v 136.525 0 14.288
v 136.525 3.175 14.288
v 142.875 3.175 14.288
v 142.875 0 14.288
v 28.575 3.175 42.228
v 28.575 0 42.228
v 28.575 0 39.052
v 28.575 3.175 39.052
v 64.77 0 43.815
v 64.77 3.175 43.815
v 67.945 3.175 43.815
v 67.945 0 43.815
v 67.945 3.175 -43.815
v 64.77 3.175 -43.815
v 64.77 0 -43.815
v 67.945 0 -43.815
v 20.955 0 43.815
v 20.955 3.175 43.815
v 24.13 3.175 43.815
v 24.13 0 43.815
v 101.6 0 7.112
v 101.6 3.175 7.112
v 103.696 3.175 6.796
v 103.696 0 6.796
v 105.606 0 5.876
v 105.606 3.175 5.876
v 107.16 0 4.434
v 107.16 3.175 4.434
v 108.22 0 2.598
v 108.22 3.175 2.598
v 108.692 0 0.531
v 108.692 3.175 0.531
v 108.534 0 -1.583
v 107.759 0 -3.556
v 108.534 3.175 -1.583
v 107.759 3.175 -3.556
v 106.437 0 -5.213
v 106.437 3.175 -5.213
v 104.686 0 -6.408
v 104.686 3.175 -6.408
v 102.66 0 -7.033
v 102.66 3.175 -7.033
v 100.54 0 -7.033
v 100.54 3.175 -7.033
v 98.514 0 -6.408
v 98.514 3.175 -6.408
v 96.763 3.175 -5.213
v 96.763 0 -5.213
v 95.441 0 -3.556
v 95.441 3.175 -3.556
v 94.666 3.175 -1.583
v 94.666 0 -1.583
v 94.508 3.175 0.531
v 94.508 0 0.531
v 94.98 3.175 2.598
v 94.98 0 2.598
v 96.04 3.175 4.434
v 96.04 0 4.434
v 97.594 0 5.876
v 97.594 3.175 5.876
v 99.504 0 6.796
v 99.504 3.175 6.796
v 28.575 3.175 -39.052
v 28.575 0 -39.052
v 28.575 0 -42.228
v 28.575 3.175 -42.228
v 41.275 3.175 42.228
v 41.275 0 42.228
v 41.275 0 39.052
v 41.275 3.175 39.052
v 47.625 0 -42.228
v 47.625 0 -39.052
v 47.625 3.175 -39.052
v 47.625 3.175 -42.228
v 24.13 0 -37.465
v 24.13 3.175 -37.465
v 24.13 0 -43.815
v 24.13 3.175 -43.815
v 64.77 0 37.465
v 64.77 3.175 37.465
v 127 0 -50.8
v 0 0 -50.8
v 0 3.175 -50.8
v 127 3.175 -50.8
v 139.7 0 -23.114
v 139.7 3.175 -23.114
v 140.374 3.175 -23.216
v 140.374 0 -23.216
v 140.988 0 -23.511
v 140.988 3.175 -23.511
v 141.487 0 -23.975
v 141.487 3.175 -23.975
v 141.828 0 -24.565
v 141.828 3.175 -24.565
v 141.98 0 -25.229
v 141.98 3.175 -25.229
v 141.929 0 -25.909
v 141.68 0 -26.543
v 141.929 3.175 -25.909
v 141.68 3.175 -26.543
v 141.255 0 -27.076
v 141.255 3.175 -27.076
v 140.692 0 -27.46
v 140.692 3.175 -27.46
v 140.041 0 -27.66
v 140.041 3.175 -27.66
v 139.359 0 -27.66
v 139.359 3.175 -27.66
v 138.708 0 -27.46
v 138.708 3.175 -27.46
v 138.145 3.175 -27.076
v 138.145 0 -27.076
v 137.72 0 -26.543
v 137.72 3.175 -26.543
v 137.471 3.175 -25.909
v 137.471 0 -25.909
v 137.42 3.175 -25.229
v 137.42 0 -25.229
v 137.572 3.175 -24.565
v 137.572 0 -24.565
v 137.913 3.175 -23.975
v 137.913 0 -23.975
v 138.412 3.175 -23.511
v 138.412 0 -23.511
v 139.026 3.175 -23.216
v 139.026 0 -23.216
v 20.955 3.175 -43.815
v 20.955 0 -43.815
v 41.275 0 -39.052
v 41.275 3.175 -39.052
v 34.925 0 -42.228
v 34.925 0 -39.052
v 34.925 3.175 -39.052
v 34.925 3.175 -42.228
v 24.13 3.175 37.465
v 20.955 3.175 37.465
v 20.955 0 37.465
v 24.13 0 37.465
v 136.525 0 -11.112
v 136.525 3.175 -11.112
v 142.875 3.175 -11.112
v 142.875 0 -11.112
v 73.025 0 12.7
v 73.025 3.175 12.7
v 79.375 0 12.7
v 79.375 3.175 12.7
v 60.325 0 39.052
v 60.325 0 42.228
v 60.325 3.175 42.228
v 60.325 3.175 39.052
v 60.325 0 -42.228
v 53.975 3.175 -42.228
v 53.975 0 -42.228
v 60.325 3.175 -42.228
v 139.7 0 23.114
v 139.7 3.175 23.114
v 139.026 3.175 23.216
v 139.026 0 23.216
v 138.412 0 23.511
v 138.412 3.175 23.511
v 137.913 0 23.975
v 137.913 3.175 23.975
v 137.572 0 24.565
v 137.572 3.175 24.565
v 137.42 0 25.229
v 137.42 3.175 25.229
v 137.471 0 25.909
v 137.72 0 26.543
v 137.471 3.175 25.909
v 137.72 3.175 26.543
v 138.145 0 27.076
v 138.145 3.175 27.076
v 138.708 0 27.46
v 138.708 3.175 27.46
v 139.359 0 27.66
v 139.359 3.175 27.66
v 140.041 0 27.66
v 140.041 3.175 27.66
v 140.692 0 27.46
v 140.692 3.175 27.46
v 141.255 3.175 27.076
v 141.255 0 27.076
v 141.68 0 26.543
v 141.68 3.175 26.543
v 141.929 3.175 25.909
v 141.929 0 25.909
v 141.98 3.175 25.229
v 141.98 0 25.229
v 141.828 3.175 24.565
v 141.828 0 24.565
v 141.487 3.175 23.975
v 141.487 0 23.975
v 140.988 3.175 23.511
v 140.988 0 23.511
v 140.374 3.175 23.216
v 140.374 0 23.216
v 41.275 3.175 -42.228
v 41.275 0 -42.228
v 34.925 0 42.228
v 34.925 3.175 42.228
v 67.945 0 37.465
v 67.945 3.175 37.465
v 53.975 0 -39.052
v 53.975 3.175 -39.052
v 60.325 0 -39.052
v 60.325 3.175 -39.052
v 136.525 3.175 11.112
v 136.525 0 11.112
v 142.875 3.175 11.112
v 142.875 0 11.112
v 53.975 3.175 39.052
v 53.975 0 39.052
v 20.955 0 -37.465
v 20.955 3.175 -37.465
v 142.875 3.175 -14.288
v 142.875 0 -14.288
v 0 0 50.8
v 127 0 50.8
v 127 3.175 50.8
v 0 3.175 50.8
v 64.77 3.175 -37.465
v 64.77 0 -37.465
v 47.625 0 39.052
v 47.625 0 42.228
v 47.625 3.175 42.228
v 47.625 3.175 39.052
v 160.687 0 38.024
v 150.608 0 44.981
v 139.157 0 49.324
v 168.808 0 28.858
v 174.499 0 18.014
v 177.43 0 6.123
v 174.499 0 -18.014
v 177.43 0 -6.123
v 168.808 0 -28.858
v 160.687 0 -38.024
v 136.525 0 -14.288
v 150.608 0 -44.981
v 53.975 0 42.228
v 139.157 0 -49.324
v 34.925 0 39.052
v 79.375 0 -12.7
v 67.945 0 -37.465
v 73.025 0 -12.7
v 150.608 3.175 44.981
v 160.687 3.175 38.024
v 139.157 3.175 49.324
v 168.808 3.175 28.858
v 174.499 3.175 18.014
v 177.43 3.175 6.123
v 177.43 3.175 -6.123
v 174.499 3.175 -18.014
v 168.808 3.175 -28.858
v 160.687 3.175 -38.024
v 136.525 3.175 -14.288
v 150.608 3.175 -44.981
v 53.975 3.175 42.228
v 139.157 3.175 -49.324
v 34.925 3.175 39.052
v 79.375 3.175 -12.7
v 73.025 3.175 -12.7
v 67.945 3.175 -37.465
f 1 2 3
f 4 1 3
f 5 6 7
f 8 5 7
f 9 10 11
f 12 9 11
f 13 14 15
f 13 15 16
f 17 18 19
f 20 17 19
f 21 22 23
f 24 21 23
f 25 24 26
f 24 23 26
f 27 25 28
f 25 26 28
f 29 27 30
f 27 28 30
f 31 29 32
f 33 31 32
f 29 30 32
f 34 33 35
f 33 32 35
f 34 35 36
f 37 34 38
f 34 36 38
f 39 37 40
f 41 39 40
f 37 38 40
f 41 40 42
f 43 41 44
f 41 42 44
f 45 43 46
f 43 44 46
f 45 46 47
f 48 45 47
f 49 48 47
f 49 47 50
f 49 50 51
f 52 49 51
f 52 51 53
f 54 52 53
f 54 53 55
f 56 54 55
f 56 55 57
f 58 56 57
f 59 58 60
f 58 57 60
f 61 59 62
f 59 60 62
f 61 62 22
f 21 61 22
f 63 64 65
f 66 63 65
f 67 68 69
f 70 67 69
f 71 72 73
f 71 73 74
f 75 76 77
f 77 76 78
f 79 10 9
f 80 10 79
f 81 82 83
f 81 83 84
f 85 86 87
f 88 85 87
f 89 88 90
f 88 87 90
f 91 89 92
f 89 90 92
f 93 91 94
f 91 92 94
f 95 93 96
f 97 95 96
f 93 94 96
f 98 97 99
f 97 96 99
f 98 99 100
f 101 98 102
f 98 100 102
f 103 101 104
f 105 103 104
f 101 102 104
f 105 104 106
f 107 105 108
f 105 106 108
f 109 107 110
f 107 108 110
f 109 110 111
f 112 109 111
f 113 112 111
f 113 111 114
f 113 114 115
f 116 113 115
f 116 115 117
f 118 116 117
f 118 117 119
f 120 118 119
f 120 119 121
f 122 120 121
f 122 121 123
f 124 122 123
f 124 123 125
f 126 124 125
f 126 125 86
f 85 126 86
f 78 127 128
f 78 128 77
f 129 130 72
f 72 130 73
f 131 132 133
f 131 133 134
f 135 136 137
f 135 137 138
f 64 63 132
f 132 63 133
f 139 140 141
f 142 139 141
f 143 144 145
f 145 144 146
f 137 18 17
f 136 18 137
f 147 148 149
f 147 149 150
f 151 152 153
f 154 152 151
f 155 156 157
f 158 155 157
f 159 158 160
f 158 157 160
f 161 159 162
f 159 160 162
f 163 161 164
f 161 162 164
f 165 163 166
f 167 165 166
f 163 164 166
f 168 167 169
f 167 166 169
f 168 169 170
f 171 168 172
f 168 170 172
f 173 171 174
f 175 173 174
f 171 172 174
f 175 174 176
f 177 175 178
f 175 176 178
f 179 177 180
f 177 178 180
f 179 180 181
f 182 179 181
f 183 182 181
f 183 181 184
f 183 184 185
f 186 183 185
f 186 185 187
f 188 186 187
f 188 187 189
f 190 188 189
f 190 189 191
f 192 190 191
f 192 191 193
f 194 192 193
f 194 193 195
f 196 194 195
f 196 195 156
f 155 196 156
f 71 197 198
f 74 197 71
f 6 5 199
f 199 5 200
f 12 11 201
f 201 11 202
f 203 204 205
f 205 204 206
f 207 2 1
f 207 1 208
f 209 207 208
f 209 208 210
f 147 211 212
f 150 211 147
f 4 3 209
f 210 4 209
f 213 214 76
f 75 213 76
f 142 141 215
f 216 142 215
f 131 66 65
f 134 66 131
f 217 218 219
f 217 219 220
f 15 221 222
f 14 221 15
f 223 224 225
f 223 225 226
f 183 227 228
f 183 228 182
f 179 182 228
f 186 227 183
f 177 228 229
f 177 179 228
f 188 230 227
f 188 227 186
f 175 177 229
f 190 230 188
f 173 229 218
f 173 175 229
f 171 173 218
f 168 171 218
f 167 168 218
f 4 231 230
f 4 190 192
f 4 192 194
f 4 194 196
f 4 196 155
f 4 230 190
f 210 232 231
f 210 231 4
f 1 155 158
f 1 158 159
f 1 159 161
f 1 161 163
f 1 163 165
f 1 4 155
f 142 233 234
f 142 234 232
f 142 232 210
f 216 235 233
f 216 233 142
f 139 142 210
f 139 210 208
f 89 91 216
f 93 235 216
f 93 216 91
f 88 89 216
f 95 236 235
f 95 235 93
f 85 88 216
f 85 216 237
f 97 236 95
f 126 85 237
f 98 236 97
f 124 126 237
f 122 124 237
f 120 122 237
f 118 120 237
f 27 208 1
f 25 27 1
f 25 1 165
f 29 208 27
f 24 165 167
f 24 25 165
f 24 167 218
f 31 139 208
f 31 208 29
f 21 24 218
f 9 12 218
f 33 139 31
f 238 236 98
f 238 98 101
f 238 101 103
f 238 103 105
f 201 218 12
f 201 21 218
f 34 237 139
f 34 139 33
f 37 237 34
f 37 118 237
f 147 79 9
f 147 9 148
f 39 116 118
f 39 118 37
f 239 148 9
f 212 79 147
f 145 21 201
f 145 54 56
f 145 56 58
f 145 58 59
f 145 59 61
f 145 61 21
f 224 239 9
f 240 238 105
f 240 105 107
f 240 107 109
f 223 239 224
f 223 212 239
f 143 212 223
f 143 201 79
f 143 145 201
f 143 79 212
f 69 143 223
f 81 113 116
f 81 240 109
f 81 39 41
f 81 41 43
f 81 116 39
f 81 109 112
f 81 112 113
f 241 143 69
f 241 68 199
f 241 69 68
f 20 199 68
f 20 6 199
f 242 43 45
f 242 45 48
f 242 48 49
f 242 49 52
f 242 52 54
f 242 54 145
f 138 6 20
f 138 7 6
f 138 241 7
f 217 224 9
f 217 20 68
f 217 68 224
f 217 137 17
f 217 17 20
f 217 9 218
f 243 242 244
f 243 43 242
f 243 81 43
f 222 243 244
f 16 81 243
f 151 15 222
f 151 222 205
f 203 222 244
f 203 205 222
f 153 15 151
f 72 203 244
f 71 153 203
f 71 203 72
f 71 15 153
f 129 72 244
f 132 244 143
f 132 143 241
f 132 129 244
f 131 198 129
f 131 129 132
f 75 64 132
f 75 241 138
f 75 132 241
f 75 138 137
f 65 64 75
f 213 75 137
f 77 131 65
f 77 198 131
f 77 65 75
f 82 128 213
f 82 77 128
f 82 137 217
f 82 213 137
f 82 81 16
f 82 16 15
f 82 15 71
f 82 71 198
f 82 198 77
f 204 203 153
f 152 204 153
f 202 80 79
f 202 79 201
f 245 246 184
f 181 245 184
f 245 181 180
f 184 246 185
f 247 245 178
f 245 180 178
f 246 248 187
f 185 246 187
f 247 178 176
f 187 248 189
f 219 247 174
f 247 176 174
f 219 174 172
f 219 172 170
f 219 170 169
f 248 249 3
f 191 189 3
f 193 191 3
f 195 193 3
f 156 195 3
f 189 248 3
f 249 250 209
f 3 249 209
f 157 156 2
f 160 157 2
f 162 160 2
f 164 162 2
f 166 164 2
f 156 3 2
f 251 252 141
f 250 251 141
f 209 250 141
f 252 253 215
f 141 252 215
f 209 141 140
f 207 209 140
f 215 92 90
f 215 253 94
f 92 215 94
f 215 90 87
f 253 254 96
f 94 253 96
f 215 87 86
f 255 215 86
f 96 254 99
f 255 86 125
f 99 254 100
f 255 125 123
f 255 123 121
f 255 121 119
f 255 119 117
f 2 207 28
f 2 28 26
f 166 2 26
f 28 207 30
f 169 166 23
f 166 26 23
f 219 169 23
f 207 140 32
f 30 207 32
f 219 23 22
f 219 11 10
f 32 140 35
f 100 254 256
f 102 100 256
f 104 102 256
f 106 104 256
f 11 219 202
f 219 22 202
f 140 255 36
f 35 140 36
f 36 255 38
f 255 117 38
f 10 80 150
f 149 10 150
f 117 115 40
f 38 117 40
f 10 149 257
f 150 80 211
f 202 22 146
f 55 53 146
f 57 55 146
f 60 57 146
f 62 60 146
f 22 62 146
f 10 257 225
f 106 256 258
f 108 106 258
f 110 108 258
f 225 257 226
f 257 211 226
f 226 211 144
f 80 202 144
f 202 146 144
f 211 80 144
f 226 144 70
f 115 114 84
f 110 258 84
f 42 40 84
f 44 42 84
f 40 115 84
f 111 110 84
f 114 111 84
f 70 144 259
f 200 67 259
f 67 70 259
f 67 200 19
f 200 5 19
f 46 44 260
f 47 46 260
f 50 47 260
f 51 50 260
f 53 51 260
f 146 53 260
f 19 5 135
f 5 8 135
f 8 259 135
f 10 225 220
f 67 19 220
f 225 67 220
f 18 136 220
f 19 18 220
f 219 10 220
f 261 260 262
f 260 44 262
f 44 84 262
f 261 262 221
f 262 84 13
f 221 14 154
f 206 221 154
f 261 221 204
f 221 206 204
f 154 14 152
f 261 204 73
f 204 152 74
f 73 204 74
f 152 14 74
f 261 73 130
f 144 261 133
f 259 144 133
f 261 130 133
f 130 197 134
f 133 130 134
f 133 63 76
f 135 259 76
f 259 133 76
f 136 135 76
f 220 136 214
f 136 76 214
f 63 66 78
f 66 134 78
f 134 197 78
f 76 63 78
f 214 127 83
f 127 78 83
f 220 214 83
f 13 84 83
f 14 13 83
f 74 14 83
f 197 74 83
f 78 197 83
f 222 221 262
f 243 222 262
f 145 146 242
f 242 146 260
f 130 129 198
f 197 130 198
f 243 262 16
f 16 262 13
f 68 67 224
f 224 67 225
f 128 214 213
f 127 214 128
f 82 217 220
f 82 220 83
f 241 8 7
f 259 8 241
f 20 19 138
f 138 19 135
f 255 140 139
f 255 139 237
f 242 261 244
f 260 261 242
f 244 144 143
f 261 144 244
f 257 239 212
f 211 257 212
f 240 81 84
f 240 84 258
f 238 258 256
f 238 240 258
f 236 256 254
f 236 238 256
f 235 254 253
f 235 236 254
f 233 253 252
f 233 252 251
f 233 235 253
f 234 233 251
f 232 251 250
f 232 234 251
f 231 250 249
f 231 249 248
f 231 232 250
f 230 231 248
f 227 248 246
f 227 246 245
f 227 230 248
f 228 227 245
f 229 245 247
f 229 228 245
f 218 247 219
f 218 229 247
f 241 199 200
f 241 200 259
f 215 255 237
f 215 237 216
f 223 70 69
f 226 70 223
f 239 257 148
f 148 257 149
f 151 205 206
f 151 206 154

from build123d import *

# Parameters (mm, degrees)
BOSS_EXTRUDE1_DEPTH = 3.175
CUT_EXTRUDE2_REACH  = 186.942
SKETCH3_W           = 3.175
SKETCH3_H           = 6.35
CUT_EXTRUDE3_REACH  = 186.942
SKETCH4_R           = 2.286
SKETCH5_W           = 6.35
SKETCH5_H           = 3.175
CUT_EXTRUDE4_DEPTH  = 3.175
SKETCH6_W           = 6.35
SKETCH6_H           = 3.175
CUT_EXTRUDE5_DEPTH  = 3.175
SKETCH7_R           = 7.112
SKETCH7_W           = 6.35
SKETCH7_H           = 25.4
CUT_EXTRUDE6_DEPTH  = 3.175


with BuildPart() as part:
    # Sketch1 → Boss-Extrude1 (new body)
    with BuildSketch(Plane(origin=(0, 0, 0), x_dir=(1, 0, 0), z_dir=(0, 1, 0))):
        with BuildLine():
            Line((0, -50.8), (0, 50.8))
            Line((0, 50.8), (127, 50.8))
            ThreePointArc((127, 50.8), (177.8, 0), (127, -50.8))
            Line((127, -50.8), (0, -50.8))
        make_face()
    extrude(amount=BOSS_EXTRUDE1_DEPTH)

    # Sketch3 → Cut-Extrude2 (cut, up to next)
    with BuildSketch(Plane(origin=(0, 3.175, 0), x_dir=(1, 0, 0), z_dir=(0, 1, 0)), mode=Mode.PRIVATE) as cut_extrude2_sk1:
        with Locations((22.5425, 40.64)):
            Rectangle(SKETCH3_W, SKETCH3_H)
    cut_extrude2_tool1 = extrude(cut_extrude2_sk1.sketch, amount=-CUT_EXTRUDE2_REACH, mode=Mode.PRIVATE) & part.part
    # Sketch3 → Cut-Extrude2 (cut, up to next)
    with BuildSketch(Plane(origin=(0, 3.175, 0), x_dir=(1, 0, 0), z_dir=(0, 1, 0)), mode=Mode.PRIVATE) as cut_extrude2_sk2:
        with Locations((66.3575, 40.64)):
            Rectangle(SKETCH3_W, SKETCH3_H)
    cut_extrude2_tool2 = extrude(cut_extrude2_sk2.sketch, amount=-CUT_EXTRUDE2_REACH, mode=Mode.PRIVATE) & part.part
    # Sketch3 → Cut-Extrude2 (cut, up to next)
    with BuildSketch(Plane(origin=(0, 3.175, 0), x_dir=(1, 0, 0), z_dir=(0, 1, 0)), mode=Mode.PRIVATE) as cut_extrude2_sk3:
        with Locations((66.3575, -40.64)):
            Rectangle(SKETCH3_W, SKETCH3_H)
    cut_extrude2_tool3 = extrude(cut_extrude2_sk3.sketch, amount=-CUT_EXTRUDE2_REACH, mode=Mode.PRIVATE) & part.part
    # Sketch3 → Cut-Extrude2 (cut, up to next)
    with BuildSketch(Plane(origin=(0, 3.175, 0), x_dir=(1, 0, 0), z_dir=(0, 1, 0)), mode=Mode.PRIVATE) as cut_extrude2_sk4:
        with Locations((22.5425, -40.64)):
            Rectangle(SKETCH3_W, SKETCH3_H)
    cut_extrude2_tool4 = extrude(cut_extrude2_sk4.sketch, amount=-CUT_EXTRUDE2_REACH, mode=Mode.PRIVATE) & part.part
    add(cut_extrude2_tool1.solids().sort_by_distance((22.5425, 3.175, -40.64))[0], mode=Mode.SUBTRACT)
    add(cut_extrude2_tool2.solids().sort_by_distance((66.3575, 3.175, -40.64))[0], mode=Mode.SUBTRACT)
    add(cut_extrude2_tool3.solids().sort_by_distance((66.3575, 3.175, 40.64))[0], mode=Mode.SUBTRACT)
    add(cut_extrude2_tool4.solids().sort_by_distance((22.5425, 3.175, 40.64))[0], mode=Mode.SUBTRACT)

    # Sketch4 → Cut-Extrude3 (cut, up to next)
    with BuildSketch(Plane(origin=(0, 3.175, 0), x_dir=(1, 0, 0), z_dir=(0, 1, 0)), mode=Mode.PRIVATE) as cut_extrude3_sk1:
        with Locations(Location((139.7, 25.4, 0), (0, 0, 270))):
            Circle(SKETCH4_R)
    cut_extrude3_tool1 = extrude(cut_extrude3_sk1.sketch, amount=-CUT_EXTRUDE3_REACH, mode=Mode.PRIVATE) & part.part
    # Sketch4 → Cut-Extrude3 (cut, up to next)
    with BuildSketch(Plane(origin=(0, 3.175, 0), x_dir=(1, 0, 0), z_dir=(0, 1, 0)), mode=Mode.PRIVATE) as cut_extrude3_sk2:
        with Locations(Location((139.7, -25.4, 0), (0, 0, 90))):
            Circle(SKETCH4_R)
    cut_extrude3_tool2 = extrude(cut_extrude3_sk2.sketch, amount=-CUT_EXTRUDE3_REACH, mode=Mode.PRIVATE) & part.part
    add(cut_extrude3_tool1.solids().sort_by_distance((139.7, 3.175, -25.4))[0], mode=Mode.SUBTRACT)
    add(cut_extrude3_tool2.solids().sort_by_distance((139.7, 3.175, 25.4))[0], mode=Mode.SUBTRACT)

    # Sketch5 → Cut-Extrude4 (cut)
    with BuildSketch(Plane(origin=(0, 3.175, 0), x_dir=(1, 0, 0), z_dir=(0, 1, 0))):
        with Locations((139.7, -12.7)):
            Rectangle(SKETCH5_W, SKETCH5_H)
        with Locations((139.7, 12.7)):
            Rectangle(SKETCH5_W, SKETCH5_H)
    extrude(amount=-CUT_EXTRUDE4_DEPTH, mode=Mode.SUBTRACT)

    # Sketch6 → Cut-Extrude5 (cut)
    with BuildSketch(Plane(origin=(0, 3.175, 0), x_dir=(1, 0, 0), z_dir=(0, 1, 0))):
        with Locations((44.45, 40.64)):
            Rectangle(SKETCH6_W, SKETCH6_H)
        with Locations((44.45, -40.64)):
            Rectangle(SKETCH6_W, SKETCH6_H)
        with Locations((57.15, 40.64)):
            Rectangle(SKETCH6_W, SKETCH6_H)
        with Locations((31.75, 40.64)):
            Rectangle(SKETCH6_W, SKETCH6_H)
        with Locations((31.75, -40.64)):
            Rectangle(SKETCH6_W, SKETCH6_H)
        with Locations((57.15, -40.64)):
            Rectangle(SKETCH6_W, SKETCH6_H)
    extrude(amount=-CUT_EXTRUDE5_DEPTH, mode=Mode.SUBTRACT)

    # Sketch7 → Cut-Extrude6 (cut)
    with BuildSketch(Plane(origin=(0, 3.175, 0), x_dir=(1, 0, 0), z_dir=(0, 1, 0))):
        with Locations(Location((101.6, 0, 0), (0, 0, 270))):
            Circle(SKETCH7_R)
        with Locations((76.2, 0)):
            Rectangle(SKETCH7_W, SKETCH7_H)
    extrude(amount=-CUT_EXTRUDE6_DEPTH, mode=Mode.SUBTRACT)


solid = part.part
